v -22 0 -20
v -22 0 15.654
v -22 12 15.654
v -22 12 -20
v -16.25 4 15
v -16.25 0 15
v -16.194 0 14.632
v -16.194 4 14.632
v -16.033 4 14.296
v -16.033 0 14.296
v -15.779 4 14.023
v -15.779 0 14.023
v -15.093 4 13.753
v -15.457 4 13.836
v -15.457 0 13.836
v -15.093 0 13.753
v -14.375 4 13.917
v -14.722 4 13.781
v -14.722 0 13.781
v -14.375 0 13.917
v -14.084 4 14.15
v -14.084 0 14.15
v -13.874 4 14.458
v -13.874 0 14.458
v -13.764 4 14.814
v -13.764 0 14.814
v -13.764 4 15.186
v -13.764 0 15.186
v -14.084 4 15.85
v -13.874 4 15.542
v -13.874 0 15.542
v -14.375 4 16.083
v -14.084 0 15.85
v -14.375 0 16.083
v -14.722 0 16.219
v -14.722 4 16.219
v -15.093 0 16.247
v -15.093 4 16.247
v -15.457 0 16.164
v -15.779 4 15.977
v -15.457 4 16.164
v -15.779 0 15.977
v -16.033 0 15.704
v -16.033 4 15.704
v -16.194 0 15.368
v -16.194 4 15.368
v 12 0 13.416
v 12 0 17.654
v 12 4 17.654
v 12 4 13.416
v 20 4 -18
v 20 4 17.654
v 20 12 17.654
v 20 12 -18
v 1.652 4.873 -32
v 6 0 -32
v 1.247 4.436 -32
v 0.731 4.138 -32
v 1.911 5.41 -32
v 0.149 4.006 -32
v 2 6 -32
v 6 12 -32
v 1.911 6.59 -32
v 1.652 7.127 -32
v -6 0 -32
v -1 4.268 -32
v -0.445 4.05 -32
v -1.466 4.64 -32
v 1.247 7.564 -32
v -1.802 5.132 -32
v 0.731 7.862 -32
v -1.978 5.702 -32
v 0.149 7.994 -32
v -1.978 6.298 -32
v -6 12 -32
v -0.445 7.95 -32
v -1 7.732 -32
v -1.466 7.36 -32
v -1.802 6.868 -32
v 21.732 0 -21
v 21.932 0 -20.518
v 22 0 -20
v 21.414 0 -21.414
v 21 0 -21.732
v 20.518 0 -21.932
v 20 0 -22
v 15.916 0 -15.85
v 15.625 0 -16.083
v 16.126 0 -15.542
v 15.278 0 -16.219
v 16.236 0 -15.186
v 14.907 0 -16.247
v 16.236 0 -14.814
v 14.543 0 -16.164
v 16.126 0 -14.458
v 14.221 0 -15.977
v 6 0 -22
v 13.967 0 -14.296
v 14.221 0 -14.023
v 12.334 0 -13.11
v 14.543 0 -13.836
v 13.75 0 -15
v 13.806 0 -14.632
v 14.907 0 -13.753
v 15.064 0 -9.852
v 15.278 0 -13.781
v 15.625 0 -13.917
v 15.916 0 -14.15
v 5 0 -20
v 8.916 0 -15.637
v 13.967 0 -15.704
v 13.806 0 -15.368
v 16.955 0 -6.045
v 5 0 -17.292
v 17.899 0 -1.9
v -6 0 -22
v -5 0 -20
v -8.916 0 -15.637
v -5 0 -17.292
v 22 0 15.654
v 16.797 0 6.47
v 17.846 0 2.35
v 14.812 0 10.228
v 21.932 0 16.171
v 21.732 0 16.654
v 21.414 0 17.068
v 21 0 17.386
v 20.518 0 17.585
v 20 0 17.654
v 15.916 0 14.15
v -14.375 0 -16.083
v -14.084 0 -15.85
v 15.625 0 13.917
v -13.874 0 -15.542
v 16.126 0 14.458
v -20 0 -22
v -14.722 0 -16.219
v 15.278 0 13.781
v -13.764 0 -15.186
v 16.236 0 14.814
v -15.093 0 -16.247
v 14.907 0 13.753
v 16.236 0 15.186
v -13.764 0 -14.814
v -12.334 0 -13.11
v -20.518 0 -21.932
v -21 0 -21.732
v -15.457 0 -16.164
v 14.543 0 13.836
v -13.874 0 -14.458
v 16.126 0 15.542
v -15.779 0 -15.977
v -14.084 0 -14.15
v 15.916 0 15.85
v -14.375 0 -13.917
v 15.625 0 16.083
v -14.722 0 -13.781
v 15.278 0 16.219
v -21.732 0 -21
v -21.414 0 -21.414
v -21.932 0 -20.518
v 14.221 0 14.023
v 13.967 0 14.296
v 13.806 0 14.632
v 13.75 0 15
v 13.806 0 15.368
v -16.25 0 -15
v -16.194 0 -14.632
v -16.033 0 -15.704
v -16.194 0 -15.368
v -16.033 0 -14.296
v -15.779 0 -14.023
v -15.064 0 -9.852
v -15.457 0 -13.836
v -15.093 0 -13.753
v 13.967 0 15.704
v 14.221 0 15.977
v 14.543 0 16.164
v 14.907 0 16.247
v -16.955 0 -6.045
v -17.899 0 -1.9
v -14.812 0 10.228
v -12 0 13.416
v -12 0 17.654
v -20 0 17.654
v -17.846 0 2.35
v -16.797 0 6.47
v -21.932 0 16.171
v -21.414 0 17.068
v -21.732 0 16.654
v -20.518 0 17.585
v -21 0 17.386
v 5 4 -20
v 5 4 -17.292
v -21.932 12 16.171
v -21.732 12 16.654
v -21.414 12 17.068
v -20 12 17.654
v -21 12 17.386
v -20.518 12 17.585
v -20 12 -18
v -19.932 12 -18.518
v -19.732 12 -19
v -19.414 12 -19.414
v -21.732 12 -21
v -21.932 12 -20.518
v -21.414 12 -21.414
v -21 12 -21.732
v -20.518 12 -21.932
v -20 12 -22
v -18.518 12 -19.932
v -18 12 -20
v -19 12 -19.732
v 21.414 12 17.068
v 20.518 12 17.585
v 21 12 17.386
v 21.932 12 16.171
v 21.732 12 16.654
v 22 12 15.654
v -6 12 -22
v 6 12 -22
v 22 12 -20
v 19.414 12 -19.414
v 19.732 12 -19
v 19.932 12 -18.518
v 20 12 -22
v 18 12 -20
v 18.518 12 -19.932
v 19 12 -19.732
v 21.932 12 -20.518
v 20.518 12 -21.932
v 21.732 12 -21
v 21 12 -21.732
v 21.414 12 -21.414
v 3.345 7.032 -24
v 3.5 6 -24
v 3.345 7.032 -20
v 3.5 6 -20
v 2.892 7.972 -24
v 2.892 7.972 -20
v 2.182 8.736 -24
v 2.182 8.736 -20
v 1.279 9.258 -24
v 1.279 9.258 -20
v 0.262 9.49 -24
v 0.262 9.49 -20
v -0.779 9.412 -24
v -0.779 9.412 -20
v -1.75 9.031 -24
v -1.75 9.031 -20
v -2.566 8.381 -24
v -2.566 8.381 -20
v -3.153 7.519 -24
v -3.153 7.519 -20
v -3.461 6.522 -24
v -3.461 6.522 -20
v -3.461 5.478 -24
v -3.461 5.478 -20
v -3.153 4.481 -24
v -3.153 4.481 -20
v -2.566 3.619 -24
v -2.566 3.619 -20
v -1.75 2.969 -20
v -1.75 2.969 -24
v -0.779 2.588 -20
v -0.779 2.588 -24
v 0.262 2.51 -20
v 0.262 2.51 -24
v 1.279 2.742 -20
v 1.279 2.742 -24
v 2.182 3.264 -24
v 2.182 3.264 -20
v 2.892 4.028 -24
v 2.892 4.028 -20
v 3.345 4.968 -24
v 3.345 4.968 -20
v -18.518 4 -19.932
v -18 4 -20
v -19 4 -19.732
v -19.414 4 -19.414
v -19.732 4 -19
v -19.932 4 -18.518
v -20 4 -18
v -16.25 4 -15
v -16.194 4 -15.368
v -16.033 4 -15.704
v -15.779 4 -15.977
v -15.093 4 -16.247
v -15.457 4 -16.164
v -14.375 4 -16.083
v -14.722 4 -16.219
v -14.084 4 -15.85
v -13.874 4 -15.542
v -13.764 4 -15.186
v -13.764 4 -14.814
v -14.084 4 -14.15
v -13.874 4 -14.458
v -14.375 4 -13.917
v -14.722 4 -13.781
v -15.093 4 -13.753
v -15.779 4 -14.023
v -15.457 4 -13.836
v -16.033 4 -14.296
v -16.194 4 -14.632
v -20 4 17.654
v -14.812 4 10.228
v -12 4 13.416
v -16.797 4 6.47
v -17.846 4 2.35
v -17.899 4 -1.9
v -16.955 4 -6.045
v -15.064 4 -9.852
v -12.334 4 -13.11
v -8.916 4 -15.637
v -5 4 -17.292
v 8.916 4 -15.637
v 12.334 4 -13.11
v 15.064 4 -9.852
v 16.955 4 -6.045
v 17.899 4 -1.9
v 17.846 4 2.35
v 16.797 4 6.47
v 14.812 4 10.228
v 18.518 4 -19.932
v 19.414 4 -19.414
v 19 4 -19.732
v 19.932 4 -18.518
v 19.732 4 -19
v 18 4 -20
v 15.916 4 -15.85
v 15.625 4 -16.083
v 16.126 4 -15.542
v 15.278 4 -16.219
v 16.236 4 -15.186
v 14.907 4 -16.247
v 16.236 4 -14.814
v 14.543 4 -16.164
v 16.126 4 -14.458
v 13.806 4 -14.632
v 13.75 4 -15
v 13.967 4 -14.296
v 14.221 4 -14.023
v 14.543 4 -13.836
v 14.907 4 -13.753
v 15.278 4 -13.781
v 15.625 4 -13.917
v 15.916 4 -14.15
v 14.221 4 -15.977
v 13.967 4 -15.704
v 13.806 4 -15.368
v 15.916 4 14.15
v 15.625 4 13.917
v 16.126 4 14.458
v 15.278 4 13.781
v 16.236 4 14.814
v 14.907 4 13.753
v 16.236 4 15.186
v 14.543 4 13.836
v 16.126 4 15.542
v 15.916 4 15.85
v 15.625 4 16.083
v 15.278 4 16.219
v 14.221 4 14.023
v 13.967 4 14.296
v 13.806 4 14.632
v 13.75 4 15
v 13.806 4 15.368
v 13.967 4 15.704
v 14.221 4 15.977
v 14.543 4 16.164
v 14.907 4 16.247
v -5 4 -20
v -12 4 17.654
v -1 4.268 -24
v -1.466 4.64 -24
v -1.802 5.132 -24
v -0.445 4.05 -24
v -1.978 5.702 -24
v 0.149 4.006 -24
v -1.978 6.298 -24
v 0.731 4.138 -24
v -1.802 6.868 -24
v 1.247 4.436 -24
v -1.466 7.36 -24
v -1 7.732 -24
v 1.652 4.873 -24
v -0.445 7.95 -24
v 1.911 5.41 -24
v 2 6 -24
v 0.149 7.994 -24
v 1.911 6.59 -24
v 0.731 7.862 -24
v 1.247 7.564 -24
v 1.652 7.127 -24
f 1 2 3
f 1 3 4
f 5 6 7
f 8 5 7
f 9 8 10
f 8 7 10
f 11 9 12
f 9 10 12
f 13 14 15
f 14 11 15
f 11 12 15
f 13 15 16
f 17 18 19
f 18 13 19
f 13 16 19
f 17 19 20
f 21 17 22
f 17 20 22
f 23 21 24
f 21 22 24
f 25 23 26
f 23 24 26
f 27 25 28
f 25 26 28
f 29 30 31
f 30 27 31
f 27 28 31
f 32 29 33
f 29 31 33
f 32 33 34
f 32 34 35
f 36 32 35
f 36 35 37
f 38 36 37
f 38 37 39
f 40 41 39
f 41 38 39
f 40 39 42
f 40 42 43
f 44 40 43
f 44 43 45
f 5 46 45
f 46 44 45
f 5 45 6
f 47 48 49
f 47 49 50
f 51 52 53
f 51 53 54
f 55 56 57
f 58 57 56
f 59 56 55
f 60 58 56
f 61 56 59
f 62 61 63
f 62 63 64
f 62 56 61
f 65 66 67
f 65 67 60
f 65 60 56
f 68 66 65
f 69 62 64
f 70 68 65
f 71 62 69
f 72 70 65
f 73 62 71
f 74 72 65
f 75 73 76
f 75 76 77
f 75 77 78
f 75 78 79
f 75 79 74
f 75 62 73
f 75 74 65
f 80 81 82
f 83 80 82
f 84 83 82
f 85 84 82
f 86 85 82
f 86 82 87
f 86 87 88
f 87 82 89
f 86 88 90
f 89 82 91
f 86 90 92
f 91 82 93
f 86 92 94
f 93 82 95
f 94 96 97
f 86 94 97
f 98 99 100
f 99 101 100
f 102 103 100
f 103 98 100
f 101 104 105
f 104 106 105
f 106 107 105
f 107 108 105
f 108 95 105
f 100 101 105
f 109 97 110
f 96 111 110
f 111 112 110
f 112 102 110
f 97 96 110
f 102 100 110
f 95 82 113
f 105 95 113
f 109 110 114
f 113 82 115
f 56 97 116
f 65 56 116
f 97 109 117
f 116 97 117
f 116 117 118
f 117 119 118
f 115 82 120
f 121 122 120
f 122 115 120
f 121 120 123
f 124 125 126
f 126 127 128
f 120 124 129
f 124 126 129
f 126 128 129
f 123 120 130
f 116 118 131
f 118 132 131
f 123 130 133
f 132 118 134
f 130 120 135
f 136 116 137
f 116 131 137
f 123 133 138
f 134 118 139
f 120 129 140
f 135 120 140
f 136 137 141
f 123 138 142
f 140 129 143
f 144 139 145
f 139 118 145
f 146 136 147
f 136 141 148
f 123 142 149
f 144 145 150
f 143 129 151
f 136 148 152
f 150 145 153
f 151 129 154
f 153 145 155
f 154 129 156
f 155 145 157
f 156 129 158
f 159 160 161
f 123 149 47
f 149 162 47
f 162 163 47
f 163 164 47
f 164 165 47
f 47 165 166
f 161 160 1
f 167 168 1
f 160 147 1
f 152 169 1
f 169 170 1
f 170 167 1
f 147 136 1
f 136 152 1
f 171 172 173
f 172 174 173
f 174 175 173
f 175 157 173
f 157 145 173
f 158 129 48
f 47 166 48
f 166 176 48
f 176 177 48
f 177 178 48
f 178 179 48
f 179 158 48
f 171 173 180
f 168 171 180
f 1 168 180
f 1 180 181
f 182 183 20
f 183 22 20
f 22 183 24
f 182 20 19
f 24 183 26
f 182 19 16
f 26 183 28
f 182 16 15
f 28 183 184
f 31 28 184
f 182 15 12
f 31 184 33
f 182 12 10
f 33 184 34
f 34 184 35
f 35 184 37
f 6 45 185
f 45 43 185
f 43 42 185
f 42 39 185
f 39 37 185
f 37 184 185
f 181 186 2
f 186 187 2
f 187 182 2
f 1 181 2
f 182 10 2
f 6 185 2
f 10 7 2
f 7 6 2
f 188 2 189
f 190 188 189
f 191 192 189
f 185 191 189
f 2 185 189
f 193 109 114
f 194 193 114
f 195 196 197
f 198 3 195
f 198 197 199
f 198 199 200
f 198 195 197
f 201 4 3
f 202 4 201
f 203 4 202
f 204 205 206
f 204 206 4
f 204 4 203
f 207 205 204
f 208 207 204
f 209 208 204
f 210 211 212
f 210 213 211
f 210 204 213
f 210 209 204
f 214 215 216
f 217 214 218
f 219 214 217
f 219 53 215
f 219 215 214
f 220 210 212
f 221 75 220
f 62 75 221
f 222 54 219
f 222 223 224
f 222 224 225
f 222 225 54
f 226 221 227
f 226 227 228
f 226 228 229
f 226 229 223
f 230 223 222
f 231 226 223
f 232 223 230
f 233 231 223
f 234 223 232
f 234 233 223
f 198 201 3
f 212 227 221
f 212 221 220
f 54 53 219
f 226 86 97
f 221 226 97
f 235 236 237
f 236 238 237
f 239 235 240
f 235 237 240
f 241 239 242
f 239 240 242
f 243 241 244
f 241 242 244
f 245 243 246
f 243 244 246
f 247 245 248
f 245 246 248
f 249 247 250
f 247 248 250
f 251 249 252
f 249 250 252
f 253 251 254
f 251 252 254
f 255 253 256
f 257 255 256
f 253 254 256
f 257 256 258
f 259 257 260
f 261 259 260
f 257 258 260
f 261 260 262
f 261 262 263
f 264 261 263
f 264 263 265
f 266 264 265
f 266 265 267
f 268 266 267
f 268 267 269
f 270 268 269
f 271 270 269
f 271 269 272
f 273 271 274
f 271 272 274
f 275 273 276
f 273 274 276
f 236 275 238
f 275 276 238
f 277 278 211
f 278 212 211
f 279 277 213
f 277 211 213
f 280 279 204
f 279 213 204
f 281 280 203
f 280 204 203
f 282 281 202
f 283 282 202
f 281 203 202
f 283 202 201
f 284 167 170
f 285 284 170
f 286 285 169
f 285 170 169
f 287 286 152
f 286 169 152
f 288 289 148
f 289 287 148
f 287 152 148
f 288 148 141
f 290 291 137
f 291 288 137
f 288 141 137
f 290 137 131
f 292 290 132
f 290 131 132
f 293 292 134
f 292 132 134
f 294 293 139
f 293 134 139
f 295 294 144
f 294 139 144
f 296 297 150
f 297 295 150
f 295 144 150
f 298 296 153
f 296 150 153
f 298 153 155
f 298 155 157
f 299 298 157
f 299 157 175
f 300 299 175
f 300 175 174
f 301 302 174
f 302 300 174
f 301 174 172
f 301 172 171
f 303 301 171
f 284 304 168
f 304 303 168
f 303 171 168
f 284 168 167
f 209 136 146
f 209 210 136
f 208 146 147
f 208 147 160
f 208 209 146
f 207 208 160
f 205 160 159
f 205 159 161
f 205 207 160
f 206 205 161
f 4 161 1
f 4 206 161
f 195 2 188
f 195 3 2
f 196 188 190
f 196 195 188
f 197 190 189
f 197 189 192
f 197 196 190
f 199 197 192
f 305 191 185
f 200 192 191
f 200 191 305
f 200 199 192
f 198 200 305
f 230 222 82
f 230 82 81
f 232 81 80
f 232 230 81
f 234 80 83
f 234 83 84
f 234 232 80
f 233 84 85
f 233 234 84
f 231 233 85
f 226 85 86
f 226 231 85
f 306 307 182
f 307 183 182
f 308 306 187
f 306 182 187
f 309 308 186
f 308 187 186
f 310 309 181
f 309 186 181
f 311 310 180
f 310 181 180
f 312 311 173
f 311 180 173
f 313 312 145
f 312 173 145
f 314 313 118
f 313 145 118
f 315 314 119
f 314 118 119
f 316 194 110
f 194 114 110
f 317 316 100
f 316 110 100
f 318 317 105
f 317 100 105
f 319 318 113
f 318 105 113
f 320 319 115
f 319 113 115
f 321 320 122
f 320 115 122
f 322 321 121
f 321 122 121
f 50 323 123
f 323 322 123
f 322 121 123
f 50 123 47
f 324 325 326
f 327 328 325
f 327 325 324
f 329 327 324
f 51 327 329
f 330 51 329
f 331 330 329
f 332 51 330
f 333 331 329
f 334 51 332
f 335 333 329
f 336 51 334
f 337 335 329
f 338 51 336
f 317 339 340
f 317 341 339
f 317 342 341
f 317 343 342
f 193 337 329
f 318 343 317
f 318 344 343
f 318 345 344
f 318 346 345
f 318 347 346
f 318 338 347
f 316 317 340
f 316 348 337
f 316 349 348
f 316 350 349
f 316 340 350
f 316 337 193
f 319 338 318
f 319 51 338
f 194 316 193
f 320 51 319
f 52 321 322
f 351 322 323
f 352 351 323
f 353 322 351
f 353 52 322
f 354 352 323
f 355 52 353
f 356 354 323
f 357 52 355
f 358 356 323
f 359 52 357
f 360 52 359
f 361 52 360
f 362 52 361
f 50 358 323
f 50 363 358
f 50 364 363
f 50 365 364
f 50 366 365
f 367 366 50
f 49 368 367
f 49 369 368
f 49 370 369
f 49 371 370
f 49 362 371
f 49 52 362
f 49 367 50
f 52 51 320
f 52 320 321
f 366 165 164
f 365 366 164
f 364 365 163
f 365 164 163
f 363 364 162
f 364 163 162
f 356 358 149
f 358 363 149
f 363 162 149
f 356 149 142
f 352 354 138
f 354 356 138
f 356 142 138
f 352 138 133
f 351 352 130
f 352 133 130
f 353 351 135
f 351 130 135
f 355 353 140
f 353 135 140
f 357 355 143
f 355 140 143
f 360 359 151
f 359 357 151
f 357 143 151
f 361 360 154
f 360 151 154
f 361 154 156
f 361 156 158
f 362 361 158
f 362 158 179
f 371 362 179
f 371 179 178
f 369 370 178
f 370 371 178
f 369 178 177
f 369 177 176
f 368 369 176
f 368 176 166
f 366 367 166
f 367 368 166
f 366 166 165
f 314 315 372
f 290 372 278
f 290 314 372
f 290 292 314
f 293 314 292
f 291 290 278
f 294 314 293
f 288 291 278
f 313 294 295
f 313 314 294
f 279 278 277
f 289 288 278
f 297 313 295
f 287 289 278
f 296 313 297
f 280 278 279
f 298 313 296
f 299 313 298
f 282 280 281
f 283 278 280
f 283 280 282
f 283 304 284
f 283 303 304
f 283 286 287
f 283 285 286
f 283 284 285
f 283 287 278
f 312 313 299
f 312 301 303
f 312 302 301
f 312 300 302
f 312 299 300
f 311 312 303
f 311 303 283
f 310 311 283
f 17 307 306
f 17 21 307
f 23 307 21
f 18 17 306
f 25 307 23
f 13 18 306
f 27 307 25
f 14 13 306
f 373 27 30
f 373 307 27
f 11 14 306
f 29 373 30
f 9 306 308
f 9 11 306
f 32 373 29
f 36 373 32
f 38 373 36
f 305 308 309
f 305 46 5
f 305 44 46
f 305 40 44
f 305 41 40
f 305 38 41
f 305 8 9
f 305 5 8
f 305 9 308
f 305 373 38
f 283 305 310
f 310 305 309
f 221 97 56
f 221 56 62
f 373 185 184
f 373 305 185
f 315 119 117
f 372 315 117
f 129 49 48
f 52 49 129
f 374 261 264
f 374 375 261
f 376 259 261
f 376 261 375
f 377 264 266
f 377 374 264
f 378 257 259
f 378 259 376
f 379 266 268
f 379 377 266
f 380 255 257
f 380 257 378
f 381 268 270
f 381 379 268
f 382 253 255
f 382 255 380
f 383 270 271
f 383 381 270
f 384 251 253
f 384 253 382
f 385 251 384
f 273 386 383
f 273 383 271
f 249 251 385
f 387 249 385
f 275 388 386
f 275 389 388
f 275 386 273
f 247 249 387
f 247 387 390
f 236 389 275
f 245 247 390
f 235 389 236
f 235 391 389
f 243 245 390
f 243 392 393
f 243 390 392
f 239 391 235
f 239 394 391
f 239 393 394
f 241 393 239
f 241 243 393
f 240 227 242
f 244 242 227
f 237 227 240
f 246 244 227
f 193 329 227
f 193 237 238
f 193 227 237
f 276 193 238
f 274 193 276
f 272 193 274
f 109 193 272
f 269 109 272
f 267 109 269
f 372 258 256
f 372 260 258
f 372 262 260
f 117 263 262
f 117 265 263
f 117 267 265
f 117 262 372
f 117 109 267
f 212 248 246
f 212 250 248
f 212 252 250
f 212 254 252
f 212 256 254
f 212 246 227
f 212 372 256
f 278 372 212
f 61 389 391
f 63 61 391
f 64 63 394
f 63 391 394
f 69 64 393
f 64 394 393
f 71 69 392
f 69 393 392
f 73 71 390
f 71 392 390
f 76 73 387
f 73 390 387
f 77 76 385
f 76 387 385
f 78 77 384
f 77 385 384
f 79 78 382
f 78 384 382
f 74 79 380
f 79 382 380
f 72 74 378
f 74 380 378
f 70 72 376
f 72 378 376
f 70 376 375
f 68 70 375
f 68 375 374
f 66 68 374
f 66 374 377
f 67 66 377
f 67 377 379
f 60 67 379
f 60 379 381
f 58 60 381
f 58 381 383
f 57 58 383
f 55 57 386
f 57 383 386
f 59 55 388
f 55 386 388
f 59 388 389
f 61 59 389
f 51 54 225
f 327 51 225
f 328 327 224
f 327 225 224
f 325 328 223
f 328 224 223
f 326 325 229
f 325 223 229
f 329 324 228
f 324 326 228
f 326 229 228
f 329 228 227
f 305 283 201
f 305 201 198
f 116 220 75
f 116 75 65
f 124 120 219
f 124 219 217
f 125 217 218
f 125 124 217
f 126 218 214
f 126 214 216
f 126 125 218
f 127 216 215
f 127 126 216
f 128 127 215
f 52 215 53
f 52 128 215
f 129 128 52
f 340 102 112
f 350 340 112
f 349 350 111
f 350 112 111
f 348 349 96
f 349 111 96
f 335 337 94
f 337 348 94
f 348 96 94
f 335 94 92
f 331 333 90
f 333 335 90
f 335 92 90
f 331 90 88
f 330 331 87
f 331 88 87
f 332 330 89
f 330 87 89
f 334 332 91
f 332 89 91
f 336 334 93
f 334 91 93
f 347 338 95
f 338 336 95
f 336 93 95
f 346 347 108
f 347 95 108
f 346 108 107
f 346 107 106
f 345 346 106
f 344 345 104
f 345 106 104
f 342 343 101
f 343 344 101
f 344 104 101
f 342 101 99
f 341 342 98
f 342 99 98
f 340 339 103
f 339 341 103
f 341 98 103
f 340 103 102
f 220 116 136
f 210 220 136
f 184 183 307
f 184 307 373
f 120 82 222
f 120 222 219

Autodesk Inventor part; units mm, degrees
ref_plane "YZ Plane" through (0, 0, 0) normal (1, 0, 0) x (0, 1, 0)
ref_plane "XZ Plane" through (0, 0, 0) normal (0, 1, 0) x (-1, 0, 0)
ref_plane "XY Plane" through (0, 0, 0) normal (0, 0, 1) x (1, 0, 0)
sketch "Sketch1" plane through (0, 0, 0) normal (0, 1, 0) x (-1, 0, 0)
  line L0 (19, 19) -> (-19, 19) construction
  line L1 (-19, 19) -> (-19, -19) construction
  line L2 (-19, -19) -> (19, -19) construction
  line L3 (19, -19) -> (19, 19) construction
  line L4 (19, 19) -> (-19, -19) construction
  line L5 (-19, 19) -> (19, -19) construction
  circle A0 centre (15, -15) radius 1.25
  circle A1 centre (-15, -15) radius 1.25
  circle A2 centre (-15, 15) radius 1.25
  circle A3 centre (15, 15) radius 1.25
  line L6 (-20, 20) -> (-20, -20)
  line L7 (-20, -20) -> (20, -20)
  line L8 (20, -20) -> (20, 20)
  line L9 (20, 20) -> (-20, -20) construction
  line L10 (-20, 20) -> (20, -20) construction
  line L11 (-22, 22) -> (-22, -22)
  line L12 (-22, -22) -> (22, -22)
  line L13 (22, -22) -> (22, 22)
  line L14 (22, 22) -> (-22, -22) construction
  line L15 (-22, 22) -> (22, -22) construction
  line L16 (12, 13.4164) -> (12, 22)
  line L17 (-12, 13.4164) -> (-12, 22)
  line L18 (20, 20) -> (12, 20)
  line L19 (-12, 20) -> (-20, 20)
  line L20 (22, 22) -> (12, 22)
  line L21 (-12, 22) -> (-22, 22)
  line L22 (5, -17.2916) -> (5, -20)
  line L23 (-5, -20) -> (-5, -17.2916)
  arc A4 (-12, 13.4164) -> (-5, -17.2916) centre (0, 0) ccw
  arc A5 (5, -17.2916) -> (12, 13.4164) centre (0, 0) ccw
  dimension "d0" = 38
  dimension "d1" = 38
  dimension "d2" = 4
  dimension "d3" = 4
  dimension "d4" = 4
  dimension "d5" = 4
  dimension "d6" = 2.5
  dimension "d7" = 2.5
  dimension "d8" = 2.5
  dimension "d9" = 2.5
  dimension "d11" = 40
  dimension "d12" = 40
  dimension "d13" = 44
  dimension "d14" = 44
  dimension "d15" = 10
  dimension "d16" = 10
  dimension "d17" = 17
  dimension "d18" = 17
  dimension "d19" = 18
  dimension "d20" = 18
extrude "Extrusion1" add sketch "Sketch1" along normal blind 4
sketch "Sketch2" plane through (0, 4, 0) normal (0, 1, 0) x (1, 0, 0)
  line L0 (22, 22) -> (-22, 22) projected
  line L1 (-22, 22) -> (22, 22)
  line L2 (12, -22) -> (22, -22) projected
  line L3 (22, 22) -> (22, -22)
  line L4 (22, -22) -> (12, -22)
  line L5 (12, -22) -> (12, -20)
  line L6 (12, -20) -> (20, -20)
  line L7 (20, -20) -> (20, 20)
  line L8 (20, 20) -> (-20, 20)
  line L9 (-20, 20) -> (-20, -20)
  line L10 (-22, -22) -> (-12, -22) projected
  line L11 (-20, 20) -> (20, 20) construction
  line L12 (-20, -20) -> (-12, -20)
  line L13 (-12, -20) -> (-12, -22)
  line L14 (-12, -22) -> (-22, -22)
  line L15 (-22, -22) -> (-22, 22)
  point P0 (0, 0)
  dimension "d23" = 2
  dimension "d24" = 8
  dimension "d25" = 40
  dimension "d26" = 40
  dimension "d27" = 40
  dimension "d28" = 90
extrude "Extrusion2" add sketch "Sketch2" along normal blind 8
sketch "Sketch3" plane through (0, 12, 0) normal (0, 1, 0) x (1, 0, 0)
  line L0 (-24.6321, -17.6536) -> (24.6321, -17.6536)
  line L1 (24.6321, -17.6536) -> (24.6321, -22.4819)
  line L2 (24.6321, -22.4819) -> (-24.6321, -22.4819)
  line L3 (-24.6321, -22.4819) -> (-24.6321, -17.6536)
  line L4 (-24.6321, -17.6536) -> (24.6321, -22.4819) construction
  line L5 (24.6321, -17.6536) -> (-24.6321, -22.4819) construction
  point P0 (0, 0)
  point P1 (0, -20.0678)
extrude "Extrusion3" cut sketch "Sketch3" against normal through all
fillet "Fillet2" radius 2 6 edges at (20, 8, -20) (-20, 8, -20) (-22, 6, 17.6536) (22, 6, 17.6536) (22, 6, -22) (-22, 6, -22)
sketch "Sketch4" plane through (20, 0, -22) normal (0, 0, -1) x (-1, 0, 0)
  line L0 (0, 0) -> (40, 0) projected
  line L1 (26, 0) -> (14, 0)
  line L2 (14, 0) -> (14, 12)
  line L3 (14, 12) -> (26, 12)
  line L4 (26, 12) -> (26, 0)
  point P0 (20, 0)
  point P1 (20, 0)
  dimension "d35" = 12
  dimension "d36" = 12
  dimension "d37" = 6
extrude "Extrusion4" add sketch "Sketch4" along normal blind 10
sketch "Sketch5" plane through (-5, 0, -20) normal (0, 0, 1) x (1, 0, 0)
  circle A0 centre (5, 6) radius 3.5
  line L0 (-13, 12) -> (23, 12) projected
  line L1 (27, 0) -> (27, 12) projected
  point P0 (5, 0)
  dimension "d40" = 7
  dimension "d41" = 6
  dimension "d42" = 22
extrude "Extrusion5" cut sketch "Sketch5" against normal blind 4
sketch "Sketch6" plane through (0, 6, -24) normal (0, 0, 1) x (1, 0, 0)
  circle A0 centre (0, 0) radius 2
  line L0 (-18, 6) -> (18, 6) projected
  line L1 (22, -6) -> (22, 6) projected
  point P0 (0, -6)
  dimension "d45" = 4
  dimension "d46" = 6
  dimension "d47" = 22
extrude "Extrusion6" cut sketch "Sketch6" against normal through all
properties part number "CameraMount1"
